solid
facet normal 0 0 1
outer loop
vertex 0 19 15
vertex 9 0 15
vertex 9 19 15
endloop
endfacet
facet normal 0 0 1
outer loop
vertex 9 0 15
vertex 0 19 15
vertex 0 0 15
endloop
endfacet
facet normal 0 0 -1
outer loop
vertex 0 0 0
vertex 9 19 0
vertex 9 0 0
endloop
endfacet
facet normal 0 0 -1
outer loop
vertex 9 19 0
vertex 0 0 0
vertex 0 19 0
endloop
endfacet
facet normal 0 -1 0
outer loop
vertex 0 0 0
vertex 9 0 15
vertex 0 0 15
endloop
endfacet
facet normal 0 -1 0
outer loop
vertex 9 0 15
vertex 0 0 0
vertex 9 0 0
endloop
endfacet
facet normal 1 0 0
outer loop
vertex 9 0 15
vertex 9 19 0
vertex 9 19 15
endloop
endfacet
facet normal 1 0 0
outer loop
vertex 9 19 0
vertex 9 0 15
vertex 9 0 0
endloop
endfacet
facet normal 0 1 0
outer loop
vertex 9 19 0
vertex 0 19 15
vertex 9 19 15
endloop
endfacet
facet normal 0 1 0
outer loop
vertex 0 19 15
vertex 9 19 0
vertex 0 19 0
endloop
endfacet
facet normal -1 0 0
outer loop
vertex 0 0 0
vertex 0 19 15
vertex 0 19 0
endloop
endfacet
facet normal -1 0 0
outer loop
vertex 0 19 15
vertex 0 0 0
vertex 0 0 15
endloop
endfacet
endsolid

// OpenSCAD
// Generated by SolidPython 1.0.1 on 2020-07-29 00:46:55


cube(size = [9, 19, 15]);
/***********************************************
*********      SolidPython code:      **********
************************************************
 
# import packages: SolidPython
from solid import *
from solid.utils import *
from itertools import chain, combinations, permutations


class Resize:

    def __init__(self, scad_file):
        self.scad_file = scad_file
        #self.scad_file = import_scad(scad_file)
        # cone/cylinder param:
        self.r1 = 0
        self.r2 = 0
        self.h = 0
        # rectangular prism param:
        self.w = 0
        self.l = 0
        # ellipse param:
        self.r = 0

    # import OpenScad code (file name corresponds to shape)


    # classify shape + parameters
    def assign(self, param1, param2, param3):
        if self.scad_file == 'cone.scad':
            self.r1 = param1
            self.r2 = param2
            self.h = param3
        elif self.scad_file == 'cylinder.scad':
            self.r1 = param1
            self.r2 = param2
            self.h = param3
        elif self.scad_file == 'rectangularPrism.scad':
            self.h = param1
            self.l = param2
            self.w = param3
        else:
            self.r = param1
            self.h = param2

    # resize parameters
    def iterate(self):
        x = range(3, 20, 2)
        i = 1
        if self.scad_file == 'cone.scad':
            tempList = list(permutations(x, 2))
            for temp in tempList:
                param1 = temp[0]
                param2 = temp[1]
                filepath = 'produced_scad_files/' + 'cone' + str(param1) + '_' + str(param2) + '_' + '.scad'
                scad_render_to_file(cylinder(h=param1, r1=param2, r2=0), filepath)

        elif self.scad_file == 'cylinder.scad':
            tempList = list(permutations(x, 3))
            for temp in tempList:
                param1 = temp[0]
                param2 = temp[1]
                filepath = 'produced_scad_files/' + 'cylinder' + str(param1) + '_' + str(param2) + '_' + '.scad'
                scad_render_to_file(cylinder(h=param1, r1=param2, r2=param2), filepath)

        elif self.scad_file == 'rectangularPrism.scad':
            tempList = list(permutations(x, 3))
            for temp in tempList:
                param1 = temp[0]
                param2 = temp[1]
                param3 = temp[2]
                filepath = 'produced_scad_files/' + 'rectangularPrism' + str(param1) + '_' + str(param2) + '_' + str(
                    param3) + '.scad'
                scad_render_to_file(cube(size=(param1, param2, param3)), filepath)

        elif self.scad_file == 'ellipse.scad':
            tempList = list(permutations(x, 4))
            for temp in tempList:
                param1 = temp[0]
                param2 = temp[1]
                param3 = temp[2]
                param4 = temp[3]
                filepath = 'produced_scad_files/' + 'ellipse' + str(param1) + '_' + str(param2) + '_' + str(param3) + '_' + str(param4) + '.scad'
                scad_render_to_file(scale([param1, param2, param3])(sphere(r=param4)), filepath)

    def render_to_scadfile(self):
        scad_render_to_file(scad, 'example.scad') 
 
************************************************/
